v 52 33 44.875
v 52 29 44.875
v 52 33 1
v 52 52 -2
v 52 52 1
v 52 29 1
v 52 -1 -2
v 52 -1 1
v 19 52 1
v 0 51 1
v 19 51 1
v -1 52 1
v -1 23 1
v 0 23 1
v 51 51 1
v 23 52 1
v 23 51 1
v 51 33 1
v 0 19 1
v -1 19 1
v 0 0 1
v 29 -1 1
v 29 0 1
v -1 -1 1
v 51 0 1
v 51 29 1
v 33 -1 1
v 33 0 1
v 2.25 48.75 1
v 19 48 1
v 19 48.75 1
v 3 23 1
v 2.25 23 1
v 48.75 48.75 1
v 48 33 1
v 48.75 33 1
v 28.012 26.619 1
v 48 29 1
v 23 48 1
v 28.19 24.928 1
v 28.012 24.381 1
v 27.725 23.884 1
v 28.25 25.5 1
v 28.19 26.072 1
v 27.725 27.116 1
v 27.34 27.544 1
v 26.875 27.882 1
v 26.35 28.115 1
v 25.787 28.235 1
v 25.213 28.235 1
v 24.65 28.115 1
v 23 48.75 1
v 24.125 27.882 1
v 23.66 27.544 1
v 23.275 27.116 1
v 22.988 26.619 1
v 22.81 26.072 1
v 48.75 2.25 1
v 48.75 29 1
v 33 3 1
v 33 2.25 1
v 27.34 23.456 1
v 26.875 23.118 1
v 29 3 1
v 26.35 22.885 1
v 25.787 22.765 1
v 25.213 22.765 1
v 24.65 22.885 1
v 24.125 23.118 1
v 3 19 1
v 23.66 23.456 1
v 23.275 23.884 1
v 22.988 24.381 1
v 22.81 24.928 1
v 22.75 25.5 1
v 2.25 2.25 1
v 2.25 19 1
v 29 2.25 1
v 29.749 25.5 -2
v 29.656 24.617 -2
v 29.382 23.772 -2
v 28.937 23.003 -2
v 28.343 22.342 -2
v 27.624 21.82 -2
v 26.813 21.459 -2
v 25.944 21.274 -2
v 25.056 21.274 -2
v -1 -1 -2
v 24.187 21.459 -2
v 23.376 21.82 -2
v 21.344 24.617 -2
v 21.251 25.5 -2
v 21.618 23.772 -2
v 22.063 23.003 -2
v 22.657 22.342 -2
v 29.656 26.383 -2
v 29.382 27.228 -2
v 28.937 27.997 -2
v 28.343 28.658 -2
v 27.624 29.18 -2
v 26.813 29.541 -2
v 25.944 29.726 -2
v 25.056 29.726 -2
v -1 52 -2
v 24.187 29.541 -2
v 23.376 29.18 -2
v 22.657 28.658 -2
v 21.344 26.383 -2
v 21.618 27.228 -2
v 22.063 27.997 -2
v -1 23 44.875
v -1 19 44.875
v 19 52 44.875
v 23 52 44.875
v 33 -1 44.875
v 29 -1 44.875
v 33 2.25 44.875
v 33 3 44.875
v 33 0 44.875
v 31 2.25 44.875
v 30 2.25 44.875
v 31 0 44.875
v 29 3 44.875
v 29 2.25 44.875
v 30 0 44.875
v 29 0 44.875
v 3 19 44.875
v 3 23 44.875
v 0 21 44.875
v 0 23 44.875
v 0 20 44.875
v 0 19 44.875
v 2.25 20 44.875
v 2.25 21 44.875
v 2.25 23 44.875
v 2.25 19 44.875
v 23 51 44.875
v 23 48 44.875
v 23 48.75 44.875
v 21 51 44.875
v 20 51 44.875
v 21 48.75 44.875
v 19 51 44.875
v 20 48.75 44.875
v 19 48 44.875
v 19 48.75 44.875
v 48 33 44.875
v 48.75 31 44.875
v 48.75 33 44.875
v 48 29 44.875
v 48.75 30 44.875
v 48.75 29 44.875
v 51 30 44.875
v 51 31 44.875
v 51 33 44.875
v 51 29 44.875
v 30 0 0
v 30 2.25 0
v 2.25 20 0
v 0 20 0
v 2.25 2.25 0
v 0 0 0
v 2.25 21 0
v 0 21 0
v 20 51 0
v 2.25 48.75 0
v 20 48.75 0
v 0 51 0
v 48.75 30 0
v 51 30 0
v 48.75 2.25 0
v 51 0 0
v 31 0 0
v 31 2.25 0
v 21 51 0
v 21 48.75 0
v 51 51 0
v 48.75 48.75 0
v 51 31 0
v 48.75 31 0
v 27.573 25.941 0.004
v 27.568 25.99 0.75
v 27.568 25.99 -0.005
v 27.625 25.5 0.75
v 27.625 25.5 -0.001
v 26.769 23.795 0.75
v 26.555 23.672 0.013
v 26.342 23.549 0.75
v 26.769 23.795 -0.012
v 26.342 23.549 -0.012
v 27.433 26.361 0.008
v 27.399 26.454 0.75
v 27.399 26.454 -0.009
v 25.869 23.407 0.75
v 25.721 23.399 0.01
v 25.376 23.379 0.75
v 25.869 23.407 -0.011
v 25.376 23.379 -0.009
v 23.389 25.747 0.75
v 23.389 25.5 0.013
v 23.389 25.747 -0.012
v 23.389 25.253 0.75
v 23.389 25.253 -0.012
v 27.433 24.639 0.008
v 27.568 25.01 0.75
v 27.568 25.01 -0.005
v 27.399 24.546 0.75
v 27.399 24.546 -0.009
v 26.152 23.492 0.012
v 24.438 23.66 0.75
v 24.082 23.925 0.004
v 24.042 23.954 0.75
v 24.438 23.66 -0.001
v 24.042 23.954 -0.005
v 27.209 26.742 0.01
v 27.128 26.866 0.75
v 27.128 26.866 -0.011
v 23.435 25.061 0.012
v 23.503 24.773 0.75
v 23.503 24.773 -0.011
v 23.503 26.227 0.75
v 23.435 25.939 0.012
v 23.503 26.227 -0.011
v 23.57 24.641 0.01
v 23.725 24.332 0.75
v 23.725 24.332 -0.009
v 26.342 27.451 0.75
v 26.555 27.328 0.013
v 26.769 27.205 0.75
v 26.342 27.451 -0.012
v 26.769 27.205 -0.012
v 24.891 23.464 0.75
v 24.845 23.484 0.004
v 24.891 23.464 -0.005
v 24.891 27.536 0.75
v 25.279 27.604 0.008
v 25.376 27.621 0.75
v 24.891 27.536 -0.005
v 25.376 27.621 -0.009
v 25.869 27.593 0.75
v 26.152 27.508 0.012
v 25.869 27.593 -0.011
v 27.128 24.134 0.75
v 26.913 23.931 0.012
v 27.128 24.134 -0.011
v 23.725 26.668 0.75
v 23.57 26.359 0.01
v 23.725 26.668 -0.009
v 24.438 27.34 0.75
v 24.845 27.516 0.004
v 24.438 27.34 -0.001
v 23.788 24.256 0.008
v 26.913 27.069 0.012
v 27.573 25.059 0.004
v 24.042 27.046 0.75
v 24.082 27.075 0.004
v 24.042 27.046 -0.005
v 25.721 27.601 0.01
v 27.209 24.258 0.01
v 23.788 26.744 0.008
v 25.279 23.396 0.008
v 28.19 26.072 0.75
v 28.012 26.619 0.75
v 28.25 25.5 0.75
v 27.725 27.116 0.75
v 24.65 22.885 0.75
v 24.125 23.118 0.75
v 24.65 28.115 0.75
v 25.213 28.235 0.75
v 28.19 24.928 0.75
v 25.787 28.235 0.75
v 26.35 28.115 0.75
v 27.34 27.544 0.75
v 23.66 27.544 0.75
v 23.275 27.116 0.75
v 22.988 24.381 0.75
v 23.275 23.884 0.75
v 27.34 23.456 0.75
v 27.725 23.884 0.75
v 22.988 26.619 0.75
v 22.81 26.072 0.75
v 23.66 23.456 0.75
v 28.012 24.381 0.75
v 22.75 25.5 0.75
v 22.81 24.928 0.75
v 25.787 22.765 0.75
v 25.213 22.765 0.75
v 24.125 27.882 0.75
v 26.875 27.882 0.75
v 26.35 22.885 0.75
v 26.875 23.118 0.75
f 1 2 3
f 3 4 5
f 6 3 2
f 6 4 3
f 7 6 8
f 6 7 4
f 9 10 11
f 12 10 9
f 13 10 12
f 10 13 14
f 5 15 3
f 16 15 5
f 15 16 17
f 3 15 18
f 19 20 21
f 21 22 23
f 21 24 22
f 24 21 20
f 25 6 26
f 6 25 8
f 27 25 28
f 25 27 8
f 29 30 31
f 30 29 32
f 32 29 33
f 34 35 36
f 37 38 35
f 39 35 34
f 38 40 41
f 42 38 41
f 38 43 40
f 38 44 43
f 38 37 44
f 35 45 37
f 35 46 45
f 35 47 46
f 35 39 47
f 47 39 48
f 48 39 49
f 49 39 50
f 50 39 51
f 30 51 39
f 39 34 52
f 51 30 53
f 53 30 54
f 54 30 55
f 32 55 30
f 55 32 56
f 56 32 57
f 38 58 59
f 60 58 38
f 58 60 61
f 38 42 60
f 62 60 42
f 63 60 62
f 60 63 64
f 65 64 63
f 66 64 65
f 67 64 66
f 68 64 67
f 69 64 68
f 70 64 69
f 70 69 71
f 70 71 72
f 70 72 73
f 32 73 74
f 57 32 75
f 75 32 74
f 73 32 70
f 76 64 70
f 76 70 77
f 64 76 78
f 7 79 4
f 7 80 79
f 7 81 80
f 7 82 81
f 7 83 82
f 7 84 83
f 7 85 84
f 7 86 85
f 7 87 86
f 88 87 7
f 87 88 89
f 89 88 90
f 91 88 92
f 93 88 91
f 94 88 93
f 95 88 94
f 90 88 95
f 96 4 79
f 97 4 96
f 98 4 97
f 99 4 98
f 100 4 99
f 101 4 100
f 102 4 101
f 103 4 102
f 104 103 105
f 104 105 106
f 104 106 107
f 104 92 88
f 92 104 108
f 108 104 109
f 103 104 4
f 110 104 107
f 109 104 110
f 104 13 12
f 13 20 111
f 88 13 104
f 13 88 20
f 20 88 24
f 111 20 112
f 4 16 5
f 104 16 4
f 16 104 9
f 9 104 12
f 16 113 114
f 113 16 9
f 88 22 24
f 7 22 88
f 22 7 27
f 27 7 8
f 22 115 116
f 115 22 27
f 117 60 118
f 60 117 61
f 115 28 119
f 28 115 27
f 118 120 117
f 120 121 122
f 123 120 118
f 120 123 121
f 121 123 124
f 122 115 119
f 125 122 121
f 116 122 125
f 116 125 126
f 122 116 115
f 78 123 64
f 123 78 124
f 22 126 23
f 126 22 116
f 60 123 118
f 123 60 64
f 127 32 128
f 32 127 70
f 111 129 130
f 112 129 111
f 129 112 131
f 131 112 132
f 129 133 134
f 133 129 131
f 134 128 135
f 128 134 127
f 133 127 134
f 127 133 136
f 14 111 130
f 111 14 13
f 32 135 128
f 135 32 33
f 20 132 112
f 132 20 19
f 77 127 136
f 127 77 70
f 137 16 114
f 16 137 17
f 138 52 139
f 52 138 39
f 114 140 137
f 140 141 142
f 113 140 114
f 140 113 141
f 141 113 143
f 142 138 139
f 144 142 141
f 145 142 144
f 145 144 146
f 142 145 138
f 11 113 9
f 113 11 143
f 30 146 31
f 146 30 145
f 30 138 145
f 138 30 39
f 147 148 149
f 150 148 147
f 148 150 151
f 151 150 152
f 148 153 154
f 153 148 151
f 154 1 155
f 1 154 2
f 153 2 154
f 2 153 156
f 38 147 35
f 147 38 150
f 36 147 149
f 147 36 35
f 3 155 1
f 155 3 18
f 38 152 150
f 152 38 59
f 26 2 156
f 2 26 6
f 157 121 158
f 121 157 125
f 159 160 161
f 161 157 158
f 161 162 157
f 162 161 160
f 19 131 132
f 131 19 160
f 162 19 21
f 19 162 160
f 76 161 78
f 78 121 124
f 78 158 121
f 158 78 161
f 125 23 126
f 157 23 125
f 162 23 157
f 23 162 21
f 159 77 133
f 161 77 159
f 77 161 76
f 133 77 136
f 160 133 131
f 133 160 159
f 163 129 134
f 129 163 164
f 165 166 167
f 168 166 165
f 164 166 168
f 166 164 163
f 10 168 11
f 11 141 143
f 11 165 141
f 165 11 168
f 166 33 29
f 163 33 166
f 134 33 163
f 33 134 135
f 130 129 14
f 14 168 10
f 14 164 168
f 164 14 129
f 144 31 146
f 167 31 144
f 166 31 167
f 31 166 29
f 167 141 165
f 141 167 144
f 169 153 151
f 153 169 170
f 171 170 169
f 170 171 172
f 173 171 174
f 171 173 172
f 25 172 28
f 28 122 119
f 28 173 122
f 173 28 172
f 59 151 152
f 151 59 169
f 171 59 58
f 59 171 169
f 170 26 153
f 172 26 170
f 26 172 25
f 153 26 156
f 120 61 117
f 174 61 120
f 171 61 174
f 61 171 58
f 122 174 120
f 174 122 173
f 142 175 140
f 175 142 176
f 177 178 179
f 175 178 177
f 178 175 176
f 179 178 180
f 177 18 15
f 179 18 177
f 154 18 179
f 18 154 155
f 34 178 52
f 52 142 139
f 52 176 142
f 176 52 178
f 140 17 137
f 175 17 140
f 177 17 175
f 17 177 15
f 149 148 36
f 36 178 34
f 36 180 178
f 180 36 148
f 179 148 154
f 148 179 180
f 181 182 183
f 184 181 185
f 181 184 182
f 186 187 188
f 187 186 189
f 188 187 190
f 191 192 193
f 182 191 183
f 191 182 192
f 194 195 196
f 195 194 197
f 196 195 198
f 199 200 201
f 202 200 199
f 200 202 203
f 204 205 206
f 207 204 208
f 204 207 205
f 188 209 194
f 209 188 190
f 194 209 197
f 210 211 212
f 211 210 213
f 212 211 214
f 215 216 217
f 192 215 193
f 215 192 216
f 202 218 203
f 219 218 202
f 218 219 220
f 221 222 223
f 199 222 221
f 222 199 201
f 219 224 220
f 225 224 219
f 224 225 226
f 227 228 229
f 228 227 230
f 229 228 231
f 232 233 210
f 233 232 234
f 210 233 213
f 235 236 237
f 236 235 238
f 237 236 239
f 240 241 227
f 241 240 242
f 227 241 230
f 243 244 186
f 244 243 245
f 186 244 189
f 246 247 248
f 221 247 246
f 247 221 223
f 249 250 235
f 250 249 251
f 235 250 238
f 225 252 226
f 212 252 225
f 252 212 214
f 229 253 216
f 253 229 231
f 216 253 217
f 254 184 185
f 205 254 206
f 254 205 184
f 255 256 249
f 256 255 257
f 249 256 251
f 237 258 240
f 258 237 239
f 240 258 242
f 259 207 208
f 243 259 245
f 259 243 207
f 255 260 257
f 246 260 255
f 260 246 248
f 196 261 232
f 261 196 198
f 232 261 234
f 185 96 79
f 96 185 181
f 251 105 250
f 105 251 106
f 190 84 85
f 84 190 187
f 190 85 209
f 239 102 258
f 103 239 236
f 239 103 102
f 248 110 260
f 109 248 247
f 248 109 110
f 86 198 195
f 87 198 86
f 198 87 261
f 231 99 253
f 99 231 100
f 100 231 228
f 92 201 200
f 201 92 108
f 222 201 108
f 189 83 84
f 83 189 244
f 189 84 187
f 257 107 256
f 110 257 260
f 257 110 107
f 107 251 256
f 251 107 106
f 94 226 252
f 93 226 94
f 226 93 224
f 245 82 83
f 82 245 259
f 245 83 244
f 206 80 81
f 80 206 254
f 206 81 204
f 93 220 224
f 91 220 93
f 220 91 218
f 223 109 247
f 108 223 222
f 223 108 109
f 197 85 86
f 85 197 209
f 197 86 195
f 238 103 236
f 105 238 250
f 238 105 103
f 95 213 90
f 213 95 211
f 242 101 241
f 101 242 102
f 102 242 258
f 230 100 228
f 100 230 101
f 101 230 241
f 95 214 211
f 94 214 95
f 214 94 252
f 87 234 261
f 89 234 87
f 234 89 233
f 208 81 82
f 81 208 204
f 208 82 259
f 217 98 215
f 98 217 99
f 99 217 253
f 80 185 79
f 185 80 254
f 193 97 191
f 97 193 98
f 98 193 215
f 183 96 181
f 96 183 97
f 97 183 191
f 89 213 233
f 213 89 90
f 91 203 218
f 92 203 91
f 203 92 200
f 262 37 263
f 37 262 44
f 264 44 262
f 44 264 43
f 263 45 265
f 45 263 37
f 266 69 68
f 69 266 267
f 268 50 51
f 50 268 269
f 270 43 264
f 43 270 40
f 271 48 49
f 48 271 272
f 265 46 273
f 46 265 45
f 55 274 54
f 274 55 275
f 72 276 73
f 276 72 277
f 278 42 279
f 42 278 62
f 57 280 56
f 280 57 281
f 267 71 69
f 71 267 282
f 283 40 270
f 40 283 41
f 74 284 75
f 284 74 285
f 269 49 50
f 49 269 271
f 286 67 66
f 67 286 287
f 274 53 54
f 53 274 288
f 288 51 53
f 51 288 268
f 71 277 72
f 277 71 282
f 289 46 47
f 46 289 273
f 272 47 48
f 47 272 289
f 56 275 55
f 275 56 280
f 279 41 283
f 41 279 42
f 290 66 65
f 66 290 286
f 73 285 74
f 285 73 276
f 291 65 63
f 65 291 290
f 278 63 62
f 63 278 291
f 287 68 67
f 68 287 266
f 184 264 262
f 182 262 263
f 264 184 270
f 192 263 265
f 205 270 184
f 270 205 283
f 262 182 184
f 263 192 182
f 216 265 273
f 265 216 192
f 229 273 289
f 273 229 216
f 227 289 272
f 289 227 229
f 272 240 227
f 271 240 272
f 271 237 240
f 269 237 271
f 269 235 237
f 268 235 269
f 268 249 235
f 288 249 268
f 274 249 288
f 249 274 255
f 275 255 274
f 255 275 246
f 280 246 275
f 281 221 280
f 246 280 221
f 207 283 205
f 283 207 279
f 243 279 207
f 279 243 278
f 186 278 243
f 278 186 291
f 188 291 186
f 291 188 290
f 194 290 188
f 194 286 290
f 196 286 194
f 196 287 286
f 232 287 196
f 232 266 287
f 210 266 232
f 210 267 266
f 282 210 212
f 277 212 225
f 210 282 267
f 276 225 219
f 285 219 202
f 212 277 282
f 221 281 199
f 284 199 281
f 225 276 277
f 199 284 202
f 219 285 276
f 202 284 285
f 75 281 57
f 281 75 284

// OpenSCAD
PROFILE_W = 30;
PROFILE_D = 20;
PROFILE_T = 2;

GAP_T = 1;
WALL_T = 2;

CENTERCOL_R = 5/2;

// 3x16
SCREW_R_1 = 3/2;
SCREW_IN_R_1 = 2/2;
SCREW_HEAD_R_1 = 6/2;
SCREW_LEN_1 = 16;

// 4x25
SCREW_R_2 = 4/2;
SCREW_IN_R_2 = 2.5/2;
SCREW_HEAD_R_2 = 8/2;
SCREW_LEN_2 = 25;

TOL = .25;
EPS = 0.001;

TOTAL_H = 50;
PROFILE_H = TOTAL_H - WALL_T*2;
SIDE = PROFILE_W + PROFILE_D + GAP_T;

$fs = .5;

module profile () {
    color ([.2, .8, 1]) {
        cube ([PROFILE_W, PROFILE_T+TOL, PROFILE_H+TOL]);
        cube ([PROFILE_T+TOL, PROFILE_D, PROFILE_H+TOL]);
    }
}

module profiles () {
    profile ();
    translate ([0, SIDE, 0]) rotate ([0, 0, -90]) profile();
    translate ([SIDE, 0, 0]) rotate ([0, 0, 90]) profile();
    translate ([SIDE, SIDE, 0]) rotate ([0, 0, 180]) profile();
}

module bottom () {
    difference () {
        union () {
            translate ([-GAP_T, -GAP_T, -WALL_T]) {
                cube ([SIDE+GAP_T*2, SIDE+GAP_T*2, WALL_T+GAP_T]);
            };
            h = PROFILE_H - TOL/2;
            translate ([PROFILE_W-GAP_T, -GAP_T, -GAP_T]) {
                cube ([PROFILE_T+GAP_T*2, PROFILE_T+GAP_T*2, h]);
            }
            translate ([-GAP_T, PROFILE_D-GAP_T, -GAP_T]) {
                cube ([PROFILE_T+GAP_T*2, PROFILE_T+GAP_T*2, h]);
            }
            translate ([PROFILE_D-GAP_T, SIDE-GAP_T-PROFILE_T, -GAP_T]) {
                cube ([PROFILE_T+GAP_T*2, PROFILE_T+GAP_T*2, h]);
            }
            translate ([SIDE-GAP_T-PROFILE_T, PROFILE_W-GAP_T, -GAP_T]) {
                cube ([PROFILE_T+GAP_T*2, PROFILE_T+GAP_T*2, h]);
            }
        }
        profiles ();
        translate ([SIDE/2, SIDE/2, -WALL_T-EPS]) {
            cylinder (WALL_T*4, r=SCREW_R_2+TOL/2);
            cylinder (SCREW_HEAD_R_2, r1=SCREW_HEAD_R_2+TOL, r2=0);
        }
        translate ([SIDE/2, SIDE/2, GAP_T-TOL]) {
            cylinder (WALL_T*4, r=CENTERCOL_R+TOL);
        }
    }
}

module top () {
    difference () {
        union () {
            translate ([-GAP_T, -GAP_T, -GAP_T]) {
                cube ([SIDE+GAP_T*2, SIDE+GAP_T*2, WALL_T+GAP_T]);
            };
            translate ([SIDE/2, SIDE/2, -PROFILE_H+GAP_T]) {
                cylinder (PROFILE_H-WALL_T, r=CENTERCOL_R);
            }
        }
        mirror ([0, 0, 1]) profiles ();
        translate ([SIDE/2, SIDE/2, -PROFILE_H-EPS]) {
            cylinder (SCREW_LEN_2+WALL_T+TOL, r=SCREW_IN_R_2);
        }
        for (x=[-1,1]) for (y=[-1,1]) {
            translate ([SIDE/2+x*SIDE/4, SIDE/2+y*SIDE/4, -GAP_T-EPS]) {
                cylinder (PROFILE_H, r=SCREW_R_1+TOL);
                cylinder (SCREW_HEAD_R_1, r1=SCREW_HEAD_R_1+TOL, r2=0);
            }
        }
    }
}

module demo () {
    difference () { union () {
    bottom ();
    translate ([0, -PROFILE_H*1.5, 0]) color ([1, 0, 0]) bottom ();
    translate ([0, 0, PROFILE_H]) color ([0, 1, 0]) top ();
    translate ([SIDE*2+20, 0, 0]) rotate ([0, 180, 0]) top ();
    } translate ([0, SIDE/2, -10]) cube ([300, 30, 300]);}
}

//demo ();
!bottom ();
top ();
